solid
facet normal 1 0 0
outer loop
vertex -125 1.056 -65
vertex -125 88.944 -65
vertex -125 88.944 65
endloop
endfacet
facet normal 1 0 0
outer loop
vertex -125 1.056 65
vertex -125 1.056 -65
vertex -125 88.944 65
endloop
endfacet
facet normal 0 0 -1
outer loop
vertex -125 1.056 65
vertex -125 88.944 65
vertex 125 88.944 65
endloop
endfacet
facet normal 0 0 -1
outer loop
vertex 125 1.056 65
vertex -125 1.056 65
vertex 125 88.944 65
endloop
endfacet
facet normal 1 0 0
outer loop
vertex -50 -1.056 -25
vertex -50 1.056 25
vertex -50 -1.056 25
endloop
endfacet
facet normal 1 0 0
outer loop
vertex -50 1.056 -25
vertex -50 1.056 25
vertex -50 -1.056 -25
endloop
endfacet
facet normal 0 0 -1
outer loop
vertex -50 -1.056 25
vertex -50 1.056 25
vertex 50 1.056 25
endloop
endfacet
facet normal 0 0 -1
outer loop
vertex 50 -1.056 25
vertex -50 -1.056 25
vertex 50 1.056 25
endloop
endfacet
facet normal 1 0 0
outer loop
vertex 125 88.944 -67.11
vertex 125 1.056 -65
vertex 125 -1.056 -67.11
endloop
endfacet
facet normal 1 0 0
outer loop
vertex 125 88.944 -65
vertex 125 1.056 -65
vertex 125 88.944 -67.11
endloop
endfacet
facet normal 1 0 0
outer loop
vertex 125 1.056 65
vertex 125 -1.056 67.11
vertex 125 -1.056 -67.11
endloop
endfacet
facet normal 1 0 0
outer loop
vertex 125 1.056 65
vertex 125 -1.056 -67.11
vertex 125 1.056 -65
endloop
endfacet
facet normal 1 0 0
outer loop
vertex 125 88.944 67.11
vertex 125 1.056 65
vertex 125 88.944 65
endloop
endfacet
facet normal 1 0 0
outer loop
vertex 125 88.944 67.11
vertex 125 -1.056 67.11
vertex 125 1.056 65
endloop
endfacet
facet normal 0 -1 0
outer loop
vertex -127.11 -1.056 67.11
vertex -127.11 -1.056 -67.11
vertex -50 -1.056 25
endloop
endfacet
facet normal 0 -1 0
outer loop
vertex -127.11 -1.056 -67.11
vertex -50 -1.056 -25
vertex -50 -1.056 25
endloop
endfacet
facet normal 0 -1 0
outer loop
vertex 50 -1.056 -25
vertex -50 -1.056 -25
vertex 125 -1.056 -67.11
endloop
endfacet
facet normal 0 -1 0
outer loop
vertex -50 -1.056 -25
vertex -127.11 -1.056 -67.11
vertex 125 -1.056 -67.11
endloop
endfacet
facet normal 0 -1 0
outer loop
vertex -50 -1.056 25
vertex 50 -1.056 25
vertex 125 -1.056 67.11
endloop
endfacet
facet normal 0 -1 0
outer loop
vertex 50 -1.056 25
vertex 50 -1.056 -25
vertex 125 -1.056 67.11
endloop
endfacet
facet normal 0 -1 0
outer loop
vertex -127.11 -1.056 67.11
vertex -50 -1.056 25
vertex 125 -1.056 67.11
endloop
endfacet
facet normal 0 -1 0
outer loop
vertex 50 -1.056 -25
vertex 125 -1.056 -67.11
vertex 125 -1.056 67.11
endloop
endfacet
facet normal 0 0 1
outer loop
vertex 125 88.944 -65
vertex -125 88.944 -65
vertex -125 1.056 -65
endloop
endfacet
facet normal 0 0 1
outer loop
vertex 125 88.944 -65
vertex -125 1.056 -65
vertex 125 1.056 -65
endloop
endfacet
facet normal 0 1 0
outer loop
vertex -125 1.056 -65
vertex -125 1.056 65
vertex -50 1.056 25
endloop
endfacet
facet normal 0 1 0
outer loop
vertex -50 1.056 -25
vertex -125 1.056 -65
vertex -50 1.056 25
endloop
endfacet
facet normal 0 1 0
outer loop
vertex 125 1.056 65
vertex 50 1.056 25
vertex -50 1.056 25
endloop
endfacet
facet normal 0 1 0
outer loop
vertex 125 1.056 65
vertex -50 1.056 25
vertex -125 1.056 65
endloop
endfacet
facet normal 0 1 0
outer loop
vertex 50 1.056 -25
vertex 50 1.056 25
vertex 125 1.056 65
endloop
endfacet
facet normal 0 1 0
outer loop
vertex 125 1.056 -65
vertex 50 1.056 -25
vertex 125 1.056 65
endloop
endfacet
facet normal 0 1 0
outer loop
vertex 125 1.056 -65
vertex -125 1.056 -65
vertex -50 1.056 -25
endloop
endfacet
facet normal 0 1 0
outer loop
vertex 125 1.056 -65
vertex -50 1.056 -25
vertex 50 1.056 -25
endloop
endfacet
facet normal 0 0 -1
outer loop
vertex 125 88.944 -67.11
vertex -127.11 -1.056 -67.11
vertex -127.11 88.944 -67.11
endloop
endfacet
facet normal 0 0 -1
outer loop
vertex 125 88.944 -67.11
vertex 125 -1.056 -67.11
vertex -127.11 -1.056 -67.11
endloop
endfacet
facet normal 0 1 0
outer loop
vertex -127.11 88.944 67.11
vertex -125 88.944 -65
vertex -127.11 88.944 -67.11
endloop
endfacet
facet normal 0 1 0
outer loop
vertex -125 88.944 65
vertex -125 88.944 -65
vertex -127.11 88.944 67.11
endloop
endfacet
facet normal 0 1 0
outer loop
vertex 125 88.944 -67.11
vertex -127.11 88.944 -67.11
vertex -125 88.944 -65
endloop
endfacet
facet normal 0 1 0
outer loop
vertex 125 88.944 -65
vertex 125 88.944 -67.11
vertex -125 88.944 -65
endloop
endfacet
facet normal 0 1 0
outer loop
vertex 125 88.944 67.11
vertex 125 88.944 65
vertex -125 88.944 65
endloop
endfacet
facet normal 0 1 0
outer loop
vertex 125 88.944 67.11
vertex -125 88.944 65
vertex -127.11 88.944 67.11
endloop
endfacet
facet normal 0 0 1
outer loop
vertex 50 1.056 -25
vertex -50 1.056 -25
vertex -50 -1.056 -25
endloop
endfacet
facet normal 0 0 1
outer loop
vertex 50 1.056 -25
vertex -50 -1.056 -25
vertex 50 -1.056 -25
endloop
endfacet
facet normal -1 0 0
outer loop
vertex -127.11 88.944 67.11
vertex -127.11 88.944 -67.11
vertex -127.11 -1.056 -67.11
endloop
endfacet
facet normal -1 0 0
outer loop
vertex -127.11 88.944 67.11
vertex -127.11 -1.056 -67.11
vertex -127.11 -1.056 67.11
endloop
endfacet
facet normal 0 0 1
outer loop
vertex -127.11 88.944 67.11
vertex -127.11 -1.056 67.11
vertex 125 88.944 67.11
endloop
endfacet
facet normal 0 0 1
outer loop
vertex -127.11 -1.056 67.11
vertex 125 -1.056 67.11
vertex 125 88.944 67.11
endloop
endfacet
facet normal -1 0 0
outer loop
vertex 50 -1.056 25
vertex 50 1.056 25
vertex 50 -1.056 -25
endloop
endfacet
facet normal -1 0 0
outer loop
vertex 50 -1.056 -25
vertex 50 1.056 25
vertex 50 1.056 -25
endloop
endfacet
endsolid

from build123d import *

# Parameters (mm, degrees)
CROQUIS1_W              = 250
CROQUIS1_H              = 130
SALIENTE_EXTRUIR1_DEPTH = 1.0555
CROQUIS3_W              = 250
CROQUIS3_H              = 90
SALIENTE_EXTRUIR2_DEPTH = 2.11
CROQUIS4_W              = 100
CROQUIS4_H              = 50
CORTAR_EXTRUIR1_DEPTH   = 2.111
CROQUIS5_W              = 134.22
CROQUIS5_H              = 90
SALIENTE_EXTRUIR3_DEPTH = 2.11


with BuildPart() as part:
    # Croquis1 → Saliente-Extruir1 (new body, symmetric)
    with BuildSketch(Plane(origin=(0, 0, 0), x_dir=(1, 0, 0), z_dir=(0, 1, 0))):
        Rectangle(CROQUIS1_W, CROQUIS1_H)
    extrude(amount=SALIENTE_EXTRUIR1_DEPTH, both=True)

    # Croquis3 → Saliente-Extruir2 (add)
    with BuildSketch(Plane.XY.offset(65)):
        with Locations((0, 43.9445)):
            Rectangle(CROQUIS3_W, CROQUIS3_H)
    saliente_extruir2 = extrude(amount=SALIENTE_EXTRUIR2_DEPTH)

    # Simetría1: Saliente-Extruir2 across plane
    add(saliente_extruir2.mirror(Plane.XY))

    # Croquis4 → Cortar-Extruir1 (cut)
    with BuildSketch(Plane(origin=(0, 1.0555, 0), x_dir=(1, 0, 0), z_dir=(0, 1, 0))):
        Rectangle(CROQUIS4_W, CROQUIS4_H)
    extrude(amount=-CORTAR_EXTRUIR1_DEPTH, mode=Mode.SUBTRACT)

    # Croquis5 → Saliente-Extruir3 (add)
    with BuildSketch(Plane.ZY.offset(125)):
        with Locations((0, 43.9445)):
            Rectangle(CROQUIS5_W, CROQUIS5_H)
    extrude(amount=SALIENTE_EXTRUIR3_DEPTH)


solid = part.part
